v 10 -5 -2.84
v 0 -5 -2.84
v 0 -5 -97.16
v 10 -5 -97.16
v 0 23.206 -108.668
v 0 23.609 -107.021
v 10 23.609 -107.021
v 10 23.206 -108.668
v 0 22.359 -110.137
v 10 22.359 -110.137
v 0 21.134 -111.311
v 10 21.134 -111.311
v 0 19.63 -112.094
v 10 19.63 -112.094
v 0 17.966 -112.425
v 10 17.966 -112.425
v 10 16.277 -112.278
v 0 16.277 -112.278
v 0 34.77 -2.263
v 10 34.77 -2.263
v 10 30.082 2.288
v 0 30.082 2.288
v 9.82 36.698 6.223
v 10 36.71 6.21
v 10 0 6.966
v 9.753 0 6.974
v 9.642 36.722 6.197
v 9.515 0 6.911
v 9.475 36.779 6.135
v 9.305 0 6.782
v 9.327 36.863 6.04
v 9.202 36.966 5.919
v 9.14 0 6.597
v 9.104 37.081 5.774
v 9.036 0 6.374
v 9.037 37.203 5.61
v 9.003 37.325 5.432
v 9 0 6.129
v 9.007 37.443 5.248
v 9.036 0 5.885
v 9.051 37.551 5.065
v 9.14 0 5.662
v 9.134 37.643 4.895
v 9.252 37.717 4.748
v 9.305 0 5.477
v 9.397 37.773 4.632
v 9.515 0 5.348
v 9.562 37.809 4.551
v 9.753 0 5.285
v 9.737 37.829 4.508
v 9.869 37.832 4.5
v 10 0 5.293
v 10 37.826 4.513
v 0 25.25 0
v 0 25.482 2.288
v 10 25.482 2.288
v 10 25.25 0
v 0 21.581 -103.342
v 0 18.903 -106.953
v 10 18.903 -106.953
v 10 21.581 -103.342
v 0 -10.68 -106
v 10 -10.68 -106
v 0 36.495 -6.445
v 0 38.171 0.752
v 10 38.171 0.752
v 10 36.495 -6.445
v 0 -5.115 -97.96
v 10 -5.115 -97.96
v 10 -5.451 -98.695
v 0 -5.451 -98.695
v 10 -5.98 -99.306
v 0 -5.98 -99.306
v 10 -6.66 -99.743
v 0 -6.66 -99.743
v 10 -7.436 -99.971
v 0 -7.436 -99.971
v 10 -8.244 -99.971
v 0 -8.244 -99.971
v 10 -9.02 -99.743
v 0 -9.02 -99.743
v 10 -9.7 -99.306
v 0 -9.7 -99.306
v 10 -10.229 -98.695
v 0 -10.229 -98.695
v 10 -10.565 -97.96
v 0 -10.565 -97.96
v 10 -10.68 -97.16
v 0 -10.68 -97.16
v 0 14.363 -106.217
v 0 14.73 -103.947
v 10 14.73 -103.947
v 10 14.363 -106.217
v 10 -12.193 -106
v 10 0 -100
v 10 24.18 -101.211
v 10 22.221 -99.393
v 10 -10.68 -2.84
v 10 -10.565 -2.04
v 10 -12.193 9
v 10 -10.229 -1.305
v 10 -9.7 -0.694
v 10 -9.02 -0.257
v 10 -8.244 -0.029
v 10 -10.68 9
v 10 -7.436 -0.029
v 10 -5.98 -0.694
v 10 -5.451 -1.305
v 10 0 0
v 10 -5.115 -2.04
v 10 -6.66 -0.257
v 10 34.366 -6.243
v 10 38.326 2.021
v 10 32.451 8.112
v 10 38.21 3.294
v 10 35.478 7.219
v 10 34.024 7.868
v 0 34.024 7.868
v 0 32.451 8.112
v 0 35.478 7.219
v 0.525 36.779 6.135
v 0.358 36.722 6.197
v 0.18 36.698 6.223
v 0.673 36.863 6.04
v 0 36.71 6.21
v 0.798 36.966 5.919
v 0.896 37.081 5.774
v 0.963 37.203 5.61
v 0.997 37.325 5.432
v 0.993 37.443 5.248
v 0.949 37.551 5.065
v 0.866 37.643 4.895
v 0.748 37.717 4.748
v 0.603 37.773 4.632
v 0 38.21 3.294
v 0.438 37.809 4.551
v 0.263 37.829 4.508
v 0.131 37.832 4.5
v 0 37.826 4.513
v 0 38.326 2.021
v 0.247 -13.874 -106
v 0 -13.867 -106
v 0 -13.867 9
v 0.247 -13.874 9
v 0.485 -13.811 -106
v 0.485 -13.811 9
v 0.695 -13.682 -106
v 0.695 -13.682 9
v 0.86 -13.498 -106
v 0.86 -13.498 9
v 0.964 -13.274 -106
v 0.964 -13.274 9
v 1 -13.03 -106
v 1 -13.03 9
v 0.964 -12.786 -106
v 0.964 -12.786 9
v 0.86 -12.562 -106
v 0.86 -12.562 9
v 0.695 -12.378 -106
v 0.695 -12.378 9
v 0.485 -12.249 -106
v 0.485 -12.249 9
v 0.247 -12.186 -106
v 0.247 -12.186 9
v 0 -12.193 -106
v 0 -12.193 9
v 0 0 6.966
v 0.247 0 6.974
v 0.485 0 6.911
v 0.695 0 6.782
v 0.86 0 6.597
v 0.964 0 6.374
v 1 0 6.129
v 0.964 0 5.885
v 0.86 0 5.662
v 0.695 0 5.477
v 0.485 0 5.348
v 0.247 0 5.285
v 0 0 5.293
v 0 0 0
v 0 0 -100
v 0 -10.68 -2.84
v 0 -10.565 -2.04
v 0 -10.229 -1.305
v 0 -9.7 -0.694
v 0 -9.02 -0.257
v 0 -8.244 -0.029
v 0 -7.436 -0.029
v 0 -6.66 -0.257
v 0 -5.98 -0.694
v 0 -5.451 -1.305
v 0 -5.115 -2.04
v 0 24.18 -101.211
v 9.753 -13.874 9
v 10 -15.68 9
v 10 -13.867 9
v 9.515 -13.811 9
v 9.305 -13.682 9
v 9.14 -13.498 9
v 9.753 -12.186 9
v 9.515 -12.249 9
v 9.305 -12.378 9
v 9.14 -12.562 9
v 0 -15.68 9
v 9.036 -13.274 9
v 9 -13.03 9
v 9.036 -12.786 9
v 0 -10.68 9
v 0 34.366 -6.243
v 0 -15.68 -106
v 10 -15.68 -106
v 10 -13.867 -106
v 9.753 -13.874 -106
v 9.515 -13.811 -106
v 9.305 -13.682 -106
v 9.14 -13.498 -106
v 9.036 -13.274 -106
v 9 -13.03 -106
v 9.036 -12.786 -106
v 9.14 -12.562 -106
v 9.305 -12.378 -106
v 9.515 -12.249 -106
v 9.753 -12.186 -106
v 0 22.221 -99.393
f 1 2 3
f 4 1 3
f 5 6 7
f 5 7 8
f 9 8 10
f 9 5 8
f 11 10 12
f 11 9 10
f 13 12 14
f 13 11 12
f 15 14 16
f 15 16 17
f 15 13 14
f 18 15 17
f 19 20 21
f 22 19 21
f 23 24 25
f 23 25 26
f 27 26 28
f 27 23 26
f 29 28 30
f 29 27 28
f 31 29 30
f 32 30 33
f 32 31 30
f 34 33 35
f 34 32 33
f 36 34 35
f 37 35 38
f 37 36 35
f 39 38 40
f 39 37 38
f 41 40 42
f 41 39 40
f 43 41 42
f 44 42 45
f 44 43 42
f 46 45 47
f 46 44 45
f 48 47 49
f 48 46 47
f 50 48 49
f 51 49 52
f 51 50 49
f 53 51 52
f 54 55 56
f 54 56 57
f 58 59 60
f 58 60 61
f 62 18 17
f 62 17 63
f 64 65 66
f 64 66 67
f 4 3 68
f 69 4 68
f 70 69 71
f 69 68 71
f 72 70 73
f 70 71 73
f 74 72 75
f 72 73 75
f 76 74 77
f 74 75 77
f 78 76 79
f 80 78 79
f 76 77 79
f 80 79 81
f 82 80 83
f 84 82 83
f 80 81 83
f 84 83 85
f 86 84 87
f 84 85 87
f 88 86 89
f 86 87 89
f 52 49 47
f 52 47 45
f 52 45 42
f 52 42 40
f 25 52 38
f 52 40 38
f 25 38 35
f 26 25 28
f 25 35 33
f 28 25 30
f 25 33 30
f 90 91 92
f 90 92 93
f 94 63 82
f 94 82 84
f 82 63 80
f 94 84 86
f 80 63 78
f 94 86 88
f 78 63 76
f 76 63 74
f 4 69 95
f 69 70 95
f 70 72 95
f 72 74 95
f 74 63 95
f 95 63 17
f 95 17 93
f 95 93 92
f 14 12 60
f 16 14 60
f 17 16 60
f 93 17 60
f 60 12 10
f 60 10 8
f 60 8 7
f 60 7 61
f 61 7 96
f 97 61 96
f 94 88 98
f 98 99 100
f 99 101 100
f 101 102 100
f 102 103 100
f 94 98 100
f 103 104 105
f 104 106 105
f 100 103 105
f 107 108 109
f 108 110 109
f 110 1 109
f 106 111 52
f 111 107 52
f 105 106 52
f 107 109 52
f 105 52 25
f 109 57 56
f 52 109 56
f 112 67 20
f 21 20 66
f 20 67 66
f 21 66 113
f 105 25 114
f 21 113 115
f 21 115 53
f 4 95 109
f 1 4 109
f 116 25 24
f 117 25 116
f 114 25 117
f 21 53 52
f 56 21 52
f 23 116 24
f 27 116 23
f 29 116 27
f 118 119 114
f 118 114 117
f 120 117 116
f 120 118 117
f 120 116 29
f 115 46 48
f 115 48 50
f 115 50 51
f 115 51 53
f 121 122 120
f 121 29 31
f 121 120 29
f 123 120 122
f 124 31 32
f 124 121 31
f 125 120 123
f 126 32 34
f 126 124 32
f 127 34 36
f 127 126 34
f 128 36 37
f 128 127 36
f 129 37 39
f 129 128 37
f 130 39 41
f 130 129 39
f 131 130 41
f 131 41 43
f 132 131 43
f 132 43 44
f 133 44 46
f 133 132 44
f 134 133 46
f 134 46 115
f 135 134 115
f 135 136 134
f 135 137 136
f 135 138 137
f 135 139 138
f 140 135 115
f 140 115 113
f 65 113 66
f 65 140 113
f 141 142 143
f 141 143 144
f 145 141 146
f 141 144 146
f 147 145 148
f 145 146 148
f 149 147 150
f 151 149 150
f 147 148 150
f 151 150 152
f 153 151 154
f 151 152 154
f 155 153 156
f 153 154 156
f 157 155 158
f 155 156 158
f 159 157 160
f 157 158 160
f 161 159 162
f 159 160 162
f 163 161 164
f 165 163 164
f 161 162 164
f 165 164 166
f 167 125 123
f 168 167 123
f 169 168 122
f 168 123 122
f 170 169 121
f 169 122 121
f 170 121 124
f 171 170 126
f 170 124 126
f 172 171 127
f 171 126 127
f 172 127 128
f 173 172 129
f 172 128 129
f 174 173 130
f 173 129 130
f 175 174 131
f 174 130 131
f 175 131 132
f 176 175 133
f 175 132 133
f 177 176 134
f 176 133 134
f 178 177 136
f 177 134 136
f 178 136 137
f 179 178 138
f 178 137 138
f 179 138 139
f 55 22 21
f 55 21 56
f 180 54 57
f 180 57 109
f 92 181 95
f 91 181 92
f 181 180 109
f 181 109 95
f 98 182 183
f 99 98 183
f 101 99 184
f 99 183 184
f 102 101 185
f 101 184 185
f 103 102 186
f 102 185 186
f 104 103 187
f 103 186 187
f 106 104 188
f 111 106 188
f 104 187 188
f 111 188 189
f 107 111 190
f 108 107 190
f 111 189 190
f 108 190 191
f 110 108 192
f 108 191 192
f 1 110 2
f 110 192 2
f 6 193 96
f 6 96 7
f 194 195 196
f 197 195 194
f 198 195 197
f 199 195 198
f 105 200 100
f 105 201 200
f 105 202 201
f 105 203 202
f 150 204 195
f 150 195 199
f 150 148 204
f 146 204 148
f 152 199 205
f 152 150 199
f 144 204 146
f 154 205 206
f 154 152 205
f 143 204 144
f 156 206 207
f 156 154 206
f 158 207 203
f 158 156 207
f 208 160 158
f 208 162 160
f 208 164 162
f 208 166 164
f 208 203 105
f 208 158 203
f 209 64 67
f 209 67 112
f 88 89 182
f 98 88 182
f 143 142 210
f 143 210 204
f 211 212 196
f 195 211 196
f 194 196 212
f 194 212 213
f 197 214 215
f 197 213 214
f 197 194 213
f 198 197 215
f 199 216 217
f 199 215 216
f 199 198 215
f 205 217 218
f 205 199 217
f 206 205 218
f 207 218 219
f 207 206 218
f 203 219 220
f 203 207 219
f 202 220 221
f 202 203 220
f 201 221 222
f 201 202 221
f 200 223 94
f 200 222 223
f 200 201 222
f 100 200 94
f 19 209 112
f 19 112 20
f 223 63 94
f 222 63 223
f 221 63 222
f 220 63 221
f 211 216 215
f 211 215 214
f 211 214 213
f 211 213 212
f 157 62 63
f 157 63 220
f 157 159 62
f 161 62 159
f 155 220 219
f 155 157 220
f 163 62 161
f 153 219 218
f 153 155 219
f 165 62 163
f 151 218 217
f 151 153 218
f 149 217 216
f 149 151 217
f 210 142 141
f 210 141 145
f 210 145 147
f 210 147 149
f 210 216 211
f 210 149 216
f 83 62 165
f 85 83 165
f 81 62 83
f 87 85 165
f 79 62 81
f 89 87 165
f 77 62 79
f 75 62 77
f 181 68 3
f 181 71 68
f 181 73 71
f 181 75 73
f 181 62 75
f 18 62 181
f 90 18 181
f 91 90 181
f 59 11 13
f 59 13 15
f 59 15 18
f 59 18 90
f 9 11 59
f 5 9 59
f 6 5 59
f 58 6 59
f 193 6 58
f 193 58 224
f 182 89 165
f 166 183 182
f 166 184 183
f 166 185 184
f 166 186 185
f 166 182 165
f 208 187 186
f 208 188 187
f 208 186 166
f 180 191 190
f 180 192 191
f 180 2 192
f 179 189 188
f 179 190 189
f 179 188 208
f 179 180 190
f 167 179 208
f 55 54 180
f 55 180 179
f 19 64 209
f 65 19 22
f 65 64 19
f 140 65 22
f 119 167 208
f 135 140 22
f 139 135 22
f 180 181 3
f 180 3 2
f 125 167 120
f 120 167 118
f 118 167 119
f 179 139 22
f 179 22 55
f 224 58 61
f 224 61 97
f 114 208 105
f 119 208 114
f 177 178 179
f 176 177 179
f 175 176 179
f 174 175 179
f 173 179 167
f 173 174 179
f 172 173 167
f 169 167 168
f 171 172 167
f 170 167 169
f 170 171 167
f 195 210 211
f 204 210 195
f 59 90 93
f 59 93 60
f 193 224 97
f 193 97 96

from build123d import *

# Parameters (mm, degrees)
BOSS_EXTRUDE1_DEPTH = 10
CUT_EXTRUDE4_REACH  = 126.4
CUT_EXTRUDE5_DEPTH  = 120.20766697


with BuildPart() as part:
    # Sketch1 → Boss-Extrude1 (new body)
    with BuildSketch(Plane(origin=(0, 0, 0), x_dir=(0, 0, -1), z_dir=(1, 0, 0))):
        with BuildLine():
            Line((0, 0), (100, 0))
            Line((100, 0), (103.946990438, 14.730368851))
            Line((103.946990438, 14.730368851), (106.217403847, 14.362642119))
            Line((106.217403847, 14.362642119), (106.952857311, 18.903468939))
            Line((106.952857311, 18.903468939), (103.341565092, 21.580990302))
            Line((103.341565092, 21.580990302), (99.393020031, 22.220515053))
            Line((99.393020031, 22.220515053), (101.210603817, 24.179837998))
            Line((101.210603817, 24.179837998), (107.020951621, 23.60910455))
            ThreePointArc((107.020951621, 23.60910455), (111.310577018, 21.133985308), (112.278030397, 16.276914661))
            Line((112.278030397, 16.276914661), (106, -10.68))
            Line((106, -10.68), (106, -15.68))
            Line((106, -15.68), (-9, -15.68))
            Line((-9, -15.68), (-9, -10.68))
            Line((-9, -10.68), (-8.111602248, 32.45071604))
            ThreePointArc((-8.111602248, 32.45071604), (-5.794866244, 37.064553263), (-0.751946881, 38.17077383))
            Line((-0.751946881, 38.17077383), (6.44531119, 36.494595175))
            Line((6.44531119, 36.494595175), (6.242876448, 34.365871735))
            Line((6.242876448, 34.365871735), (2.263353613, 34.770096924))
            Line((2.263353613, 34.770096924), (-2.28822563, 30.082429484))
            Line((-2.28822563, 30.082429484), (-2.28822563, 25.482429484))
            Line((-2.28822563, 25.482429484), (0, 25.25))
            Line((0, 25.25), (0, 0))
        make_face()
        with BuildLine():
            Line((2.84, -5), (97.16, -5))
            ThreePointArc((97.16, -5), (100, -7.84), (97.16, -10.68))
            Line((97.16, -10.68), (2.84, -10.68))
            ThreePointArc((2.84, -10.68), (0, -7.84), (2.84, -5))
        make_face(mode=Mode.SUBTRACT)
    extrude(amount=BOSS_EXTRUDE1_DEPTH)

    # Cut-Extrude4: up to this plane
    cut_extrude4_end = Plane(origin=(0, 0, 0), z_dir=(0, 1, 0))
    # Sketch2 → Cut-Extrude4 (cut, up to the surface)
    with BuildSketch(Plane(origin=(0, 38.268671352, -0.788250341), x_dir=(1, 0, 0), z_dir=(0, 0.9997879328481811, -0.020593429320073266)), mode=Mode.PRIVATE) as cut_extrude4_sk1:
        with BuildLine():
            Line((0, -5.291493544), (0, -6.964813597))
            ThreePointArc((0, -6.964813597), (1, -6.12815357), (0, -5.291493544))
        make_face()
    cut_extrude4_tool1 = split(extrude(cut_extrude4_sk1.sketch, amount=-CUT_EXTRUDE4_REACH, mode=Mode.PRIVATE), bisect_by=cut_extrude4_end, keep=Keep.BOTH, mode=Mode.PRIVATE)
    cut_extrude4 = cut_extrude4_tool1.solids().sort_by_distance((0.431182, 38.394871, 5.338604))[0]
    add(cut_extrude4, mode=Mode.SUBTRACT)

    # Mirror1: Cut-Extrude4 across plane
    add(cut_extrude4.mirror(Plane(origin=(5, 0, 0), x_dir=(0, 0, 1), z_dir=(1, 0, 0))), mode=Mode.SUBTRACT)

    # Sketch3 → Cut-Extrude5 (cut, symmetric)
    with BuildSketch(Plane.XY):
        with BuildLine():
            ThreePointArc((0, -13.866660027), (1, -13.03), (0, -12.193339973))
            Line((0, -12.193339973), (0, -13.866660027))
        make_face()
    cut_extrude5 = extrude(amount=CUT_EXTRUDE5_DEPTH, both=True, mode=Mode.SUBTRACT)

    # Mirror2: Cut-Extrude5 across plane
    add(cut_extrude5.mirror(Plane(origin=(5, 0, 0), x_dir=(0, 0, 1), z_dir=(1, 0, 0))), mode=Mode.SUBTRACT)


solid = part.part
